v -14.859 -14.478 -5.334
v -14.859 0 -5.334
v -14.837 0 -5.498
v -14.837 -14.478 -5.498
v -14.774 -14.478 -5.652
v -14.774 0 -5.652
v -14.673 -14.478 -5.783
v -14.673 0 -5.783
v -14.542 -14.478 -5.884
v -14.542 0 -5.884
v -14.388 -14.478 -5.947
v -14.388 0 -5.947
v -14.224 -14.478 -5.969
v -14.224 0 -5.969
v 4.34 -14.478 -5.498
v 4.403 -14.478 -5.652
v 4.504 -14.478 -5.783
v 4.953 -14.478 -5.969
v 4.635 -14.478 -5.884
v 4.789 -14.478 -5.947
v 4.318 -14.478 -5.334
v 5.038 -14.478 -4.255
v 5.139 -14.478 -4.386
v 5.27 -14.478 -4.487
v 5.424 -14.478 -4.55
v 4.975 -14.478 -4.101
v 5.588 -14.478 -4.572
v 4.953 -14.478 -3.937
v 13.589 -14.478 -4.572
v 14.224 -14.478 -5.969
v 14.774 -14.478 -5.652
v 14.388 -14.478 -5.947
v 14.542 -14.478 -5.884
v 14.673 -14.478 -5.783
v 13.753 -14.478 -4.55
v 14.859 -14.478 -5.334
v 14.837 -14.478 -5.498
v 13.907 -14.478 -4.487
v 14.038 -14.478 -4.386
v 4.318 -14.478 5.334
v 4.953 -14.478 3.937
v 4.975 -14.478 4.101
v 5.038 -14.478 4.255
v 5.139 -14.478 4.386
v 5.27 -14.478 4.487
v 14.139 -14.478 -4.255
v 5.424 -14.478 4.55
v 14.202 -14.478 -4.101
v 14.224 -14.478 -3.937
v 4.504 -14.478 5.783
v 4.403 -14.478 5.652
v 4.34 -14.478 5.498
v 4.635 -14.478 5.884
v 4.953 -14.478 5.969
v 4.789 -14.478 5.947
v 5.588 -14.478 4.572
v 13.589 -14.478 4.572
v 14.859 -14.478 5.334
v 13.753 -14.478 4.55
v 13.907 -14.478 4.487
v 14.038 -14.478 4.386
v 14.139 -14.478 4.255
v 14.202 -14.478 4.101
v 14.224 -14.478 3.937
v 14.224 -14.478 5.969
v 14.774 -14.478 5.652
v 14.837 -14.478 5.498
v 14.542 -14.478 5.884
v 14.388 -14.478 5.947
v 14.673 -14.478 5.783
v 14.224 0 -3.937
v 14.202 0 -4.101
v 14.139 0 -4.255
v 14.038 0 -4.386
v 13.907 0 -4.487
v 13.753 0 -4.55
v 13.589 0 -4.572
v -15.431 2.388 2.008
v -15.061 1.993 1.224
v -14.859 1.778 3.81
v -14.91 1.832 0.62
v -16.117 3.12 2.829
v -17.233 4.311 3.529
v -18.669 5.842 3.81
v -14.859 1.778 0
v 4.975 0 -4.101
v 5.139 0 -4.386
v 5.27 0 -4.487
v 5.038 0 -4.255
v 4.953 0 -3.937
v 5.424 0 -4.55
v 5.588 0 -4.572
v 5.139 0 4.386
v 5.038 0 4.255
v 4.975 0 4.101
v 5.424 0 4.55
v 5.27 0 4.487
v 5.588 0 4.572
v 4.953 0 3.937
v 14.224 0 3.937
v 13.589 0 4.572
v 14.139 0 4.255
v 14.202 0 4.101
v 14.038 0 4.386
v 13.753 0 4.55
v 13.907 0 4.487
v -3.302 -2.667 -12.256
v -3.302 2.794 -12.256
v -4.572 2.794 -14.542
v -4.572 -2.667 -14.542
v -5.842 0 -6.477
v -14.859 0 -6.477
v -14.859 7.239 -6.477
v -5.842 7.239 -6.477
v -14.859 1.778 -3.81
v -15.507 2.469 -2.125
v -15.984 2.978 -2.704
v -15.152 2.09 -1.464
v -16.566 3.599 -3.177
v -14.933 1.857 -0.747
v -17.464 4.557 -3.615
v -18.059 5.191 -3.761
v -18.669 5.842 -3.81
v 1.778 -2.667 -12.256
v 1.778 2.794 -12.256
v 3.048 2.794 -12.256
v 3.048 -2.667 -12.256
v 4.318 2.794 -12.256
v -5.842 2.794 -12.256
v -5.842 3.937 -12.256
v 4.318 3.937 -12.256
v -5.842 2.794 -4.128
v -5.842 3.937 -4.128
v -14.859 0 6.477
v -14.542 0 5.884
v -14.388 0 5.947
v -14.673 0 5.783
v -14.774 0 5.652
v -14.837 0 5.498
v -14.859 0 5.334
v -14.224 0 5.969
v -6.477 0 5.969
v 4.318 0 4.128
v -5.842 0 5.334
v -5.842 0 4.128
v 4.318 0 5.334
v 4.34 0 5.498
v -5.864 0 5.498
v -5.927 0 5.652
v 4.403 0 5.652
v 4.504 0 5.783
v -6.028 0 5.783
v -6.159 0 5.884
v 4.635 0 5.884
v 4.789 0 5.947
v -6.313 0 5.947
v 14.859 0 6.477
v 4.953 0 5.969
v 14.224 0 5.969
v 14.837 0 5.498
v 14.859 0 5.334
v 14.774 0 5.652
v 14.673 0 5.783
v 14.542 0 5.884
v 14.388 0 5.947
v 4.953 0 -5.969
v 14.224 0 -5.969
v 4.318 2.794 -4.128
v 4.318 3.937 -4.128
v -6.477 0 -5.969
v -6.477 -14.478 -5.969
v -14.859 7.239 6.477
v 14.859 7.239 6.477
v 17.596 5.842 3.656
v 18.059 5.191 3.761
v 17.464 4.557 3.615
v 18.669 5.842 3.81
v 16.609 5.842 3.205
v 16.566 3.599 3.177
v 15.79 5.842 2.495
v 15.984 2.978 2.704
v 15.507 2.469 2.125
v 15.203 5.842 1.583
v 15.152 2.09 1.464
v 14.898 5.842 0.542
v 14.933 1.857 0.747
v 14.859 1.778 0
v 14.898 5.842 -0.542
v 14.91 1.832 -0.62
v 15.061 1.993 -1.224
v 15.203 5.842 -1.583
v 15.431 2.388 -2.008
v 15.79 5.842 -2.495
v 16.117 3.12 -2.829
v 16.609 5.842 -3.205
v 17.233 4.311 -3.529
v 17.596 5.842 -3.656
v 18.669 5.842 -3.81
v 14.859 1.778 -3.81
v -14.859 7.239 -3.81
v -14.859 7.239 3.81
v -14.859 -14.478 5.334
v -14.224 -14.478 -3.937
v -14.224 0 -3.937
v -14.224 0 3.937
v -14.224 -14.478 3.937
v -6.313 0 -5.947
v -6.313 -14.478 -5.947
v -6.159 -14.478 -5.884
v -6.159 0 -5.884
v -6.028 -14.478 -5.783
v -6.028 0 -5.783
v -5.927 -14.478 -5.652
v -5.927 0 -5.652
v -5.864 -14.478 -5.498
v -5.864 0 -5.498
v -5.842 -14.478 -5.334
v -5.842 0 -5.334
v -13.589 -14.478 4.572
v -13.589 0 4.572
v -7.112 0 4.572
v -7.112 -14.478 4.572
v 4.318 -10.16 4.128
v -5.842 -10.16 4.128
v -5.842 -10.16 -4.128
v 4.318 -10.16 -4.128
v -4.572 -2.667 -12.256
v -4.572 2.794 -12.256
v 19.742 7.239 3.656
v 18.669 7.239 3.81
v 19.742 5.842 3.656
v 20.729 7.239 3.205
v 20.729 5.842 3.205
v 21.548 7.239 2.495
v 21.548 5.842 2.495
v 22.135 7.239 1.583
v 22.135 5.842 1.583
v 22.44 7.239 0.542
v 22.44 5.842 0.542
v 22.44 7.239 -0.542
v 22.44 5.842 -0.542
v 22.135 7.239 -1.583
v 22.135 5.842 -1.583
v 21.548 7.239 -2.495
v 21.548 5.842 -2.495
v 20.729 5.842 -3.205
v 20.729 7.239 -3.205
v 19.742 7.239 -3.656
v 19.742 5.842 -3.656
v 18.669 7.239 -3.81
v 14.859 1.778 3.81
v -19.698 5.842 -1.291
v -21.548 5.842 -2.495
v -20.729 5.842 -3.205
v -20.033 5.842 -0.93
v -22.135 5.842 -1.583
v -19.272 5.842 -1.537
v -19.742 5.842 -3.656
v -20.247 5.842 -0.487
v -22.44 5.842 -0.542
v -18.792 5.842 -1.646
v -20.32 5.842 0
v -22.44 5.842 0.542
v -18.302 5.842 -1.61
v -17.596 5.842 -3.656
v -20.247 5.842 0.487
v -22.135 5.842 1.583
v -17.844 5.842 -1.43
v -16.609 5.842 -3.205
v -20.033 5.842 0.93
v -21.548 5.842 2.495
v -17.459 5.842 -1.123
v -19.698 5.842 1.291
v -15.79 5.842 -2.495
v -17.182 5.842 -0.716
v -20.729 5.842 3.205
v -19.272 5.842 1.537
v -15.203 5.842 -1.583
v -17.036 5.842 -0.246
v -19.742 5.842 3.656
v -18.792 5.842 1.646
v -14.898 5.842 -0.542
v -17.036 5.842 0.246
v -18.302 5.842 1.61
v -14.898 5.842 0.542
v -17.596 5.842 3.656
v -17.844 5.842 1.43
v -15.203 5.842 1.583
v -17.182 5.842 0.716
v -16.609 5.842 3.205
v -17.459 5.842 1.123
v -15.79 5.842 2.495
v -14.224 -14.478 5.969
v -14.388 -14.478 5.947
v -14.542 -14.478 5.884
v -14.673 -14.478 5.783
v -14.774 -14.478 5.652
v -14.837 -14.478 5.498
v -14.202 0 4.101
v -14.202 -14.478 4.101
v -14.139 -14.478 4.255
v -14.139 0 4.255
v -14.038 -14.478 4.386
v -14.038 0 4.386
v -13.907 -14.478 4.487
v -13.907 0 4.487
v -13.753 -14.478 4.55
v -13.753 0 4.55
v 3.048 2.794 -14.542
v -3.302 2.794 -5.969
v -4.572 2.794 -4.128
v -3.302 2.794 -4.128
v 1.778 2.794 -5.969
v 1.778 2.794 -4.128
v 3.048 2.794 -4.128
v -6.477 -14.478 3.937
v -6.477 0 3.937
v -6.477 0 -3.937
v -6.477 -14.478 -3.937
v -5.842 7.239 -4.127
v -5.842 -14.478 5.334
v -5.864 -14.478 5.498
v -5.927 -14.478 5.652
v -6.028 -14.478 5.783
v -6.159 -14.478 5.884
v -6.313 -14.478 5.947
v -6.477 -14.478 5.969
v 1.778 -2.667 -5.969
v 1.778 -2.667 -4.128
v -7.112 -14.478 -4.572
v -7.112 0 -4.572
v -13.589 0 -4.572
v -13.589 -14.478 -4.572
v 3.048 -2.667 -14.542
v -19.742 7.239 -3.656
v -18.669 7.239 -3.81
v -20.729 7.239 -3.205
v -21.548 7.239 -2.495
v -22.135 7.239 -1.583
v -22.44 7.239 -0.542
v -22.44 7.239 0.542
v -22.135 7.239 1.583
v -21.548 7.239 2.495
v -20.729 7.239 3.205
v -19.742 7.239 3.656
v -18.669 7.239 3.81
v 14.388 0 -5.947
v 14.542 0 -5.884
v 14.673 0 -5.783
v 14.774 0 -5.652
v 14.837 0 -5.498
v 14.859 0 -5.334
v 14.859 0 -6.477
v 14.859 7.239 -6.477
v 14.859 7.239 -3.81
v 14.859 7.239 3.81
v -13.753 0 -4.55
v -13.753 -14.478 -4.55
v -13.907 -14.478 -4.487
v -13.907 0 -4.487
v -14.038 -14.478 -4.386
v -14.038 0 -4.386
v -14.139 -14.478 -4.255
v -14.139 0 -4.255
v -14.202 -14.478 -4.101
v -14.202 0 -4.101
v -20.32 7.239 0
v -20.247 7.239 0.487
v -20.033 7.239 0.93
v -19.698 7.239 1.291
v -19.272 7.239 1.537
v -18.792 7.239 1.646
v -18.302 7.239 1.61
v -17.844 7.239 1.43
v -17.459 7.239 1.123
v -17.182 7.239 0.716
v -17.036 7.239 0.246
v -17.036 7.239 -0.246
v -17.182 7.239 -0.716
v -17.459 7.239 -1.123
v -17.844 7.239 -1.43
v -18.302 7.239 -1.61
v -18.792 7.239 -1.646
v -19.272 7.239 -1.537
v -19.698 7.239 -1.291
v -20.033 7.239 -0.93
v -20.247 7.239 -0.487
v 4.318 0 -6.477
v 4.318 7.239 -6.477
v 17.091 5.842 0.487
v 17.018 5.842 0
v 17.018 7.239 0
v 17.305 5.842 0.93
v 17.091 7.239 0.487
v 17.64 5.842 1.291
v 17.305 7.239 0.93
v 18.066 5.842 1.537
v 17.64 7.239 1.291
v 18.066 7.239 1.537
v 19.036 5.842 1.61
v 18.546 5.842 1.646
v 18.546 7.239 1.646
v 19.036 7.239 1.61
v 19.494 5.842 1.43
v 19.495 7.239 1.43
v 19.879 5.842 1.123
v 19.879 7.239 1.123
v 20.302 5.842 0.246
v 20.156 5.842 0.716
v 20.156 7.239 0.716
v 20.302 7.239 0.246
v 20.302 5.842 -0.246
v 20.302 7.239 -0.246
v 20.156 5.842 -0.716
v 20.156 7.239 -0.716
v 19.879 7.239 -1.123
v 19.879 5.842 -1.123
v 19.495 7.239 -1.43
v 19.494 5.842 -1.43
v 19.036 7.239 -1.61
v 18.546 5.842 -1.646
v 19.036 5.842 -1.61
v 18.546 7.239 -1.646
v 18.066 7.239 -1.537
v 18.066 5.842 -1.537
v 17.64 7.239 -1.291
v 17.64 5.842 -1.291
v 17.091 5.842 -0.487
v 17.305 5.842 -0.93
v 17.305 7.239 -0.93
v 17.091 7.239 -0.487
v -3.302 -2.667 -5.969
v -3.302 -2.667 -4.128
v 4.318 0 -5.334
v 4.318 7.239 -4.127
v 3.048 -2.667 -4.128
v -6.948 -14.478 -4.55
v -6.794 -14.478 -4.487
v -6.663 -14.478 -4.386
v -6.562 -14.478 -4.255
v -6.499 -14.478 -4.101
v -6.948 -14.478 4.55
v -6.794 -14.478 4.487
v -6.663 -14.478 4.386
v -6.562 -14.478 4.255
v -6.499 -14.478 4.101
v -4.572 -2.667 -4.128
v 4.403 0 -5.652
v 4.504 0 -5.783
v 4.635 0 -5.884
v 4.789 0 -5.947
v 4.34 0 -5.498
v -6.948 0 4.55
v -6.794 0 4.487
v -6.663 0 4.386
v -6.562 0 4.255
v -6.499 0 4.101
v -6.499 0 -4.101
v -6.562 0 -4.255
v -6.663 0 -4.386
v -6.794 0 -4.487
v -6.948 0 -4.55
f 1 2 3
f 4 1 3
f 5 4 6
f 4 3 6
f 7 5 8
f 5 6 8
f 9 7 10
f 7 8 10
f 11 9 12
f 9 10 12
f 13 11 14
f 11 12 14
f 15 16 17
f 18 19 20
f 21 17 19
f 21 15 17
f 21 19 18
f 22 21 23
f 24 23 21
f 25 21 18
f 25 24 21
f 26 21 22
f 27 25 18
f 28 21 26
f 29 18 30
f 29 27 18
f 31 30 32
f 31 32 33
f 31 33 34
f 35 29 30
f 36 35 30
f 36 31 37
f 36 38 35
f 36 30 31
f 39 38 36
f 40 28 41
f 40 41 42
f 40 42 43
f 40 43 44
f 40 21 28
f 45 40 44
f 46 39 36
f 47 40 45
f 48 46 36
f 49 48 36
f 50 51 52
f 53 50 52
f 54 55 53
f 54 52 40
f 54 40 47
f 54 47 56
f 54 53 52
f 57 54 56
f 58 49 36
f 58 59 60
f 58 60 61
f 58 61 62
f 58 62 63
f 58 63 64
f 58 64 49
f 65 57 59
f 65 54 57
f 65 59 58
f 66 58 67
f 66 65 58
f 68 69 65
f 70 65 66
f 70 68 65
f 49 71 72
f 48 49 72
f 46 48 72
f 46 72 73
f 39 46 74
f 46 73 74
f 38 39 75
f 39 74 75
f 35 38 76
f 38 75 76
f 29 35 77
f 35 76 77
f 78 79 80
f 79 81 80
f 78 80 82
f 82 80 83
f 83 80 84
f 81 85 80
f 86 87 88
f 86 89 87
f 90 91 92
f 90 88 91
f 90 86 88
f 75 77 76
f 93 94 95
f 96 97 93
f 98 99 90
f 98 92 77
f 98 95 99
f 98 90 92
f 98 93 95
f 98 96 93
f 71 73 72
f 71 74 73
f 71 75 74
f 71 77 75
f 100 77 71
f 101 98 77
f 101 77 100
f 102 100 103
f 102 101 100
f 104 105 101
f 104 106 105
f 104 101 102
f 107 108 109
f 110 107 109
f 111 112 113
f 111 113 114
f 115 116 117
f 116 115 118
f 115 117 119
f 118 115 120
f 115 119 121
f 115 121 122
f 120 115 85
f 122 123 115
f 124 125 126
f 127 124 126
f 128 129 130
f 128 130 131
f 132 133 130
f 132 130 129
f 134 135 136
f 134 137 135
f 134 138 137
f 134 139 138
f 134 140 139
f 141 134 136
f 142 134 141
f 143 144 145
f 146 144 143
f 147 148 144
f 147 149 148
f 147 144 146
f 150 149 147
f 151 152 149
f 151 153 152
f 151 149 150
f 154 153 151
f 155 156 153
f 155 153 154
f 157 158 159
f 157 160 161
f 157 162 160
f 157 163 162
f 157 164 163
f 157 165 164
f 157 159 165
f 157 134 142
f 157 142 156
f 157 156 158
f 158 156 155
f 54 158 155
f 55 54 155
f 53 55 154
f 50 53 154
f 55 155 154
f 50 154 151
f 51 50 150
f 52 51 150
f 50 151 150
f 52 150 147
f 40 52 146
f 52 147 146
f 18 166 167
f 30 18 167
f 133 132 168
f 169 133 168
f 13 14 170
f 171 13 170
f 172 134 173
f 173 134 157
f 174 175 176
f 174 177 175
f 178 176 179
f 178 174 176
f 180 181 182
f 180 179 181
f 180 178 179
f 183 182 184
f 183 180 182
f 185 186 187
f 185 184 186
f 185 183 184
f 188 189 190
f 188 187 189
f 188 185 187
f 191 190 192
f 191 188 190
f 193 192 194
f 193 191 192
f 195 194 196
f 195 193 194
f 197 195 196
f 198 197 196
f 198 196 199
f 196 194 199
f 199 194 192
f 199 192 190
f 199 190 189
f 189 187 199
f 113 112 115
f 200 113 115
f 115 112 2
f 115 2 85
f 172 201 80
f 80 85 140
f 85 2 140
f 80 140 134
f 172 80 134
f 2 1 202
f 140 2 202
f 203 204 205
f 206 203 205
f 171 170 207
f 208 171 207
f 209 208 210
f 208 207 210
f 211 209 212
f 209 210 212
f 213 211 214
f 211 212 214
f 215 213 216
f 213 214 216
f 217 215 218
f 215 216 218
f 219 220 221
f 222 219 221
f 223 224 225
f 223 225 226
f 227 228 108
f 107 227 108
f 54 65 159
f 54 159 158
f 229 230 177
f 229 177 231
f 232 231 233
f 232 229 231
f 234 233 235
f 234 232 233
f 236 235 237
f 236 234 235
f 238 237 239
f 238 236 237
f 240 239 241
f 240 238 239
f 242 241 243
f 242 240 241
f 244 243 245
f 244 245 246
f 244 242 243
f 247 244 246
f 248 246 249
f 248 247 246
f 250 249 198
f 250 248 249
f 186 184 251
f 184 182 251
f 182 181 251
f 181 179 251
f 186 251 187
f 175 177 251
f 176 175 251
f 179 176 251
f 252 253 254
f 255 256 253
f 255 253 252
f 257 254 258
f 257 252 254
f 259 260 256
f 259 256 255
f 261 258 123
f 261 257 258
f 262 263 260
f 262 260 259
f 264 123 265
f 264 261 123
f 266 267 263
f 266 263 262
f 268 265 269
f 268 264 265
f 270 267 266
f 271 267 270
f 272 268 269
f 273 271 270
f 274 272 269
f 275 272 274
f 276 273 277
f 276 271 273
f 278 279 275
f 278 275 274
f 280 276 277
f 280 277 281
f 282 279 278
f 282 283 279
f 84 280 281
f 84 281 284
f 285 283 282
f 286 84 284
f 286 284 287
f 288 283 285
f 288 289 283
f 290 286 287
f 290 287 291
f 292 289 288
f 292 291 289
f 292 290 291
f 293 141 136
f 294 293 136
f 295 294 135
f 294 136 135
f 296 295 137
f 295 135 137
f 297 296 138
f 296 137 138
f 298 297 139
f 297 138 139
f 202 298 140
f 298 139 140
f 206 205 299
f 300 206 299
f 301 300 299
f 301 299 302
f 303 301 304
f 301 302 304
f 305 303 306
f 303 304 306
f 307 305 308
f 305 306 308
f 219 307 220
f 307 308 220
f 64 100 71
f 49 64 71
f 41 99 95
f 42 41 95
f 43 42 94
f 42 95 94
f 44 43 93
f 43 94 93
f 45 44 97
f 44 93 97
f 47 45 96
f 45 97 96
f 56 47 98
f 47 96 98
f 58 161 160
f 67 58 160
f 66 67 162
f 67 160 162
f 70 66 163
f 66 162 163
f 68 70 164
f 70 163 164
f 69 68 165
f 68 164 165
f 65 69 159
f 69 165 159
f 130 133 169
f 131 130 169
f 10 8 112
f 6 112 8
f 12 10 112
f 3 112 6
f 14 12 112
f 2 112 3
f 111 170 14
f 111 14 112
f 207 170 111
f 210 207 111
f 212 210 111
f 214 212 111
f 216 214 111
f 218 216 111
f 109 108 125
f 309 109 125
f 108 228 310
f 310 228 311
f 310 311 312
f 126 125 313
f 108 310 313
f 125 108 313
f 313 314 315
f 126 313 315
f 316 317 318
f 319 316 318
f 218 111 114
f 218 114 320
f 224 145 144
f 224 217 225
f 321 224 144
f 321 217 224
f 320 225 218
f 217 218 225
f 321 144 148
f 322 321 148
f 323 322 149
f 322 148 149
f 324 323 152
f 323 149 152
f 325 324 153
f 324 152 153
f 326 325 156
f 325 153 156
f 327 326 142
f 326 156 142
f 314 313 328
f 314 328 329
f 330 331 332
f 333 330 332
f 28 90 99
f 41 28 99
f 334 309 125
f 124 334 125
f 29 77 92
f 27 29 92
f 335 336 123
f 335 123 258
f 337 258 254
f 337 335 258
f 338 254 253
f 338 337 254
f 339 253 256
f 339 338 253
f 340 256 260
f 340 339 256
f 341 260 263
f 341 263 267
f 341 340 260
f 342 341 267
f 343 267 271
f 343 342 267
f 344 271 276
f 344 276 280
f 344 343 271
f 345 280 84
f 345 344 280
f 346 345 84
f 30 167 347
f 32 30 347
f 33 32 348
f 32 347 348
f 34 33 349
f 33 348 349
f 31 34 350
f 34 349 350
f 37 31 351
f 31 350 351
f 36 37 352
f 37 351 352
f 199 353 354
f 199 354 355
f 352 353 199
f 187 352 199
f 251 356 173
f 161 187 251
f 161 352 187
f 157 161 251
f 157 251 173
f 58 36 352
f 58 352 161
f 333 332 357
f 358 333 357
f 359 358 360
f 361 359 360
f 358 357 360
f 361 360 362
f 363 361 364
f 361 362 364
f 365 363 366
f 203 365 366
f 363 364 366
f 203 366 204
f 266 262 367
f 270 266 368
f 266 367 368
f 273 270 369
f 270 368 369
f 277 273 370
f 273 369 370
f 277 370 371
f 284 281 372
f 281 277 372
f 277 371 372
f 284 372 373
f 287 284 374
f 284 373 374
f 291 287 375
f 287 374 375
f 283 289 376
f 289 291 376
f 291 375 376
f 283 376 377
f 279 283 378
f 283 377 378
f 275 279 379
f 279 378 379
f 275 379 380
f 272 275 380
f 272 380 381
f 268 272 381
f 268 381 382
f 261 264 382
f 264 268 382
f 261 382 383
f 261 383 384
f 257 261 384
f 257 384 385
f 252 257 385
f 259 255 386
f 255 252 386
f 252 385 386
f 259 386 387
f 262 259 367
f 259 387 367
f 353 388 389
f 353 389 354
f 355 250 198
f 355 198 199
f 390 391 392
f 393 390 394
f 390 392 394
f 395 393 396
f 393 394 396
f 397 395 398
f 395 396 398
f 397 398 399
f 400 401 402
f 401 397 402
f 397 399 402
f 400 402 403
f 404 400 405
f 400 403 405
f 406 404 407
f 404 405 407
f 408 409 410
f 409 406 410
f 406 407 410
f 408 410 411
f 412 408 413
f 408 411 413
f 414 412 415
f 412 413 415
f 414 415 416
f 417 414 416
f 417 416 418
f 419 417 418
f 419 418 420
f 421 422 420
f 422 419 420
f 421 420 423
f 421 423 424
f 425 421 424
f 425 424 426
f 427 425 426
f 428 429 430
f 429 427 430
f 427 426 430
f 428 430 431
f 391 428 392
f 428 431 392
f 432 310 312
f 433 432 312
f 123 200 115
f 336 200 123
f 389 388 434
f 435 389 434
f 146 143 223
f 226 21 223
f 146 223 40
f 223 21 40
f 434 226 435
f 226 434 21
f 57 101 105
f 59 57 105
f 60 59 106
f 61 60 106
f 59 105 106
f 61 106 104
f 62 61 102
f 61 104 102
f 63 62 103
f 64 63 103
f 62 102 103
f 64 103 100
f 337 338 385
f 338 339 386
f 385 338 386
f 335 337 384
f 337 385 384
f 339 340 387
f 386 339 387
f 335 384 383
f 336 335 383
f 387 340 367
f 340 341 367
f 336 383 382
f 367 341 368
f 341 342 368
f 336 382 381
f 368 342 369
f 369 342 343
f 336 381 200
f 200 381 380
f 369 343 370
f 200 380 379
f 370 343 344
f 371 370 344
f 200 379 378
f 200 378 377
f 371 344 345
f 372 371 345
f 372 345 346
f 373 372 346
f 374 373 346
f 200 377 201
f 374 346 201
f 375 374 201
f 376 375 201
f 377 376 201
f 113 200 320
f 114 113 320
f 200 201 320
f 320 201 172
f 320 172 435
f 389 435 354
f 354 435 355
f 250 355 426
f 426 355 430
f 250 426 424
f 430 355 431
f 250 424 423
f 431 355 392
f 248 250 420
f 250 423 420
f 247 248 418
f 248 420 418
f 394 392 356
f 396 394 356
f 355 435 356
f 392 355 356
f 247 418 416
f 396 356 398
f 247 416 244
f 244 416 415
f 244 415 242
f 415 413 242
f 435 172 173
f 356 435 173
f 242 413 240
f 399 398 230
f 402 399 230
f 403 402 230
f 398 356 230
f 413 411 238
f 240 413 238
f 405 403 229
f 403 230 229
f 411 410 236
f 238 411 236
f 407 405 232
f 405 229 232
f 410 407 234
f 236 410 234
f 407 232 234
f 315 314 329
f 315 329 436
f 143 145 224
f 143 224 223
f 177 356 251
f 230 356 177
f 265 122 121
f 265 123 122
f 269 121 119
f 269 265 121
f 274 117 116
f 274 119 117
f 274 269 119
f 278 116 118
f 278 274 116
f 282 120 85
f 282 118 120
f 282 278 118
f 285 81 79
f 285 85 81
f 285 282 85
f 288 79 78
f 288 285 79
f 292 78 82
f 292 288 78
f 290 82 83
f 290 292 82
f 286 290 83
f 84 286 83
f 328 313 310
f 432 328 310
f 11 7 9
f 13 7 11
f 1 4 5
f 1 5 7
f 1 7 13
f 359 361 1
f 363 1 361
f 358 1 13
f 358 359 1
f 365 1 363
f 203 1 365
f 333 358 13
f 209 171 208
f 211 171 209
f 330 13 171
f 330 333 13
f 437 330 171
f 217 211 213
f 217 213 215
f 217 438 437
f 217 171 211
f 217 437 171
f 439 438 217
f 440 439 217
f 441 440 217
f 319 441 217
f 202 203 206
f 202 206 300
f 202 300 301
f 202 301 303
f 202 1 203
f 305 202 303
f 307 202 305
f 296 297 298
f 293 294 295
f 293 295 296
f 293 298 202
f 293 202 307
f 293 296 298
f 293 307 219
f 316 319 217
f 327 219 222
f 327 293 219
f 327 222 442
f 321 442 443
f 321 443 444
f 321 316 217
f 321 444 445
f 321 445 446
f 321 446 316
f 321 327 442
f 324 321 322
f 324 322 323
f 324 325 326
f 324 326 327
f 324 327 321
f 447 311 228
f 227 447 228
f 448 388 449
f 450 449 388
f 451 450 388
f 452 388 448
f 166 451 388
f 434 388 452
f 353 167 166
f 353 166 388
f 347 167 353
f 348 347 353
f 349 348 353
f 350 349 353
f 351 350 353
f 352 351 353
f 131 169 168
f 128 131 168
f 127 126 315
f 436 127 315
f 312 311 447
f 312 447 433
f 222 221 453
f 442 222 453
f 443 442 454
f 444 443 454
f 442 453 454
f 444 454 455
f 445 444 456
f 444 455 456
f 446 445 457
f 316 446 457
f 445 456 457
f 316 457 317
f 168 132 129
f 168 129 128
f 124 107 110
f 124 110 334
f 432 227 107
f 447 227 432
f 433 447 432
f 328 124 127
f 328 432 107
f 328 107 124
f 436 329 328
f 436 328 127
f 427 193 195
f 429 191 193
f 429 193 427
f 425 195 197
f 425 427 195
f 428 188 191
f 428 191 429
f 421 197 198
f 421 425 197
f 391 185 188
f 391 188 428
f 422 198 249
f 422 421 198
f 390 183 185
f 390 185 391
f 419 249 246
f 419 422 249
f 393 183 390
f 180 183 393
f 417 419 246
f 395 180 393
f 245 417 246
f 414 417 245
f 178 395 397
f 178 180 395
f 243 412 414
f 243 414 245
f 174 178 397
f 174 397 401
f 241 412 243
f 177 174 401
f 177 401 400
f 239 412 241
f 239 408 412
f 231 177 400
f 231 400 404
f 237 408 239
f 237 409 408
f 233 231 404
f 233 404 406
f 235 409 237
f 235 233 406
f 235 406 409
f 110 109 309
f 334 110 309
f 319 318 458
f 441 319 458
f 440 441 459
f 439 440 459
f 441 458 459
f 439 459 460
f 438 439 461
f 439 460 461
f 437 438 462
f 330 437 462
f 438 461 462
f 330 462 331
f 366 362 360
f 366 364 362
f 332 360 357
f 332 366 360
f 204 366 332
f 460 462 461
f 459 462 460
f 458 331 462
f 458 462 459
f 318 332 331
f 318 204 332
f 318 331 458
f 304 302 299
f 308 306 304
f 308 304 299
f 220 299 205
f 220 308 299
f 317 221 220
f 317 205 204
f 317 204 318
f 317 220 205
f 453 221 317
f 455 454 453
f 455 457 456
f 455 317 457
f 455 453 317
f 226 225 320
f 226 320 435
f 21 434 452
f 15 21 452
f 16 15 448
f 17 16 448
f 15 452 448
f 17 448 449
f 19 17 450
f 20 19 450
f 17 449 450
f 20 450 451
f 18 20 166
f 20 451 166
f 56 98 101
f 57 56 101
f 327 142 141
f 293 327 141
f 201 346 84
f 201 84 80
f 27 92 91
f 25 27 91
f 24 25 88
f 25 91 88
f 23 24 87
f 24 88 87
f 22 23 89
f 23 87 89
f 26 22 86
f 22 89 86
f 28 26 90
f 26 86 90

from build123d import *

# Parameters (mm, degrees)
F0_W      = 29.718
F0_H      = 12.954
F1_DEPTH  = 7.239
F3_DEPTH  = 14.478
F5_DEPTH  = 14.478
F6_W      = 10.16
F6_H      = 8.255
F7_DEPTH  = 10.16
F8_R      = 1.651
F9_DEPTH  = 5.461
F10_W     = 3.81
F10_H     = 4.064
F11_DEPTH = 10.288
F12_R     = 3.81
F13_DEPTH = 20.321
F14_W     = 10.16
F14_H     = 2.3495
F15_DEPTH = 7.24
F16_W     = 10.16
F16_H     = 1.143
F17_DEPTH = 8.128
F18_W     = 1.27
F18_H     = 1.8415
F19_DEPTH = 5.461


with BuildPart() as f1:
    # F0 (on Front) → F1 (new body)
    with BuildSketch(Plane.XZ):
        Rectangle(F0_W, F0_H)
    extrude(amount=-F1_DEPTH)

    # F2 (on face) → F3 (join)
    with BuildSketch(Plane.XZ):
        with BuildLine():
            Line((-6.477, 5.969), (-14.224, 5.969))
            ThreePointArc((-14.224, 5.969), (-14.673013, 5.783013), (-14.859, 5.334))
            Line((-14.859, 5.334), (-14.859, -5.334))
            ThreePointArc((-14.859, -5.334), (-14.673013, -5.783013), (-14.224, -5.969))
            Line((-14.224, -5.969), (-6.477, -5.969))
            ThreePointArc((-6.477, -5.969), (-6.027987, -5.783013), (-5.842, -5.334))
            Line((-5.842, -5.334), (-5.842, 5.334))
            ThreePointArc((-5.842, 5.334), (-6.027987, 5.783013), (-6.477, 5.969))
        make_face()
        with BuildLine():
            Line((-14.224, -3.937), (-14.224, 3.937))
            ThreePointArc((-14.224, 3.937), (-14.038013, 4.386013), (-13.589, 4.572))
            Line((-13.589, 4.572), (-7.112, 4.572))
            ThreePointArc((-7.112, 4.572), (-6.662987, 4.386013), (-6.477, 3.937))
            Line((-6.477, 3.937), (-6.477, -3.937))
            ThreePointArc((-6.477, -3.937), (-6.662987, -4.386013), (-7.112, -4.572))
            Line((-7.112, -4.572), (-13.589, -4.572))
            ThreePointArc((-13.589, -4.572), (-14.038013, -4.386013), (-14.224, -3.937))
        make_face(mode=Mode.SUBTRACT)
    extrude(amount=F3_DEPTH)

    # F4 (on face) → F5 (join, through all)
    with BuildSketch(Plane.XZ):
        with BuildLine():
            Line((14.224, 5.969), (4.953, 5.969))
            ThreePointArc((4.953, 5.969), (4.503987, 5.783013), (4.318, 5.334))
            Line((4.318, 5.334), (4.318, -5.334))
            ThreePointArc((4.318, -5.334), (4.503987, -5.783013), (4.953, -5.969))
            Line((4.953, -5.969), (14.224, -5.969))
            ThreePointArc((14.224, -5.969), (14.673013, -5.783013), (14.859, -5.334))
            Line((14.859, -5.334), (14.859, 5.334))
            ThreePointArc((14.859, 5.334), (14.673013, 5.783013), (14.224, 5.969))
        make_face()
        with BuildLine():
            ThreePointArc((4.953, 3.937), (5.138987, 4.386013), (5.588, 4.572))
            Line((5.588, 4.572), (13.589, 4.572))
            ThreePointArc((13.589, 4.572), (14.038013, 4.386013), (14.224, 3.937))
            Line((14.224, 3.937), (14.224, -3.937))
            ThreePointArc((14.224, -3.937), (14.038013, -4.386013), (13.589, -4.572))
            Line((13.589, -4.572), (5.588, -4.572))
            ThreePointArc((5.588, -4.572), (5.138987, -4.386013), (4.953, -3.937))
            Line((4.953, -3.937), (4.953, 3.937))
        make_face(mode=Mode.SUBTRACT)
    extrude(amount=F5_DEPTH)

    # F6 (on face) → F7 (join)
    with BuildSketch(Plane.XZ):
        with Locations((-0.762, 0)):
            Rectangle(F6_W, F6_H)
    extrude(amount=F7_DEPTH)

    # F8 (on face) → F9 (join)
    with BuildSketch(Plane(origin=(0, 7.239, 0), x_dir=(-1, 0, 0), z_dir=(0, 1, 0))):
        with BuildLine():
            Line((14.859, -3.81), (18.669, -3.81))
            ThreePointArc((18.669, -3.81), (22.479, 0), (18.669, 3.81))
            Line((18.669, 3.81), (14.859, 3.81))
            Line((14.859, 3.81), (14.859, -3.81))
        make_face()
        with Locations((18.669, 0)):
            Circle(F8_R, mode=Mode.SUBTRACT)
        with BuildLine():
            Line((-18.669, -3.81), (-14.859, -3.81))
            Line((-14.859, -3.81), (-14.859, 3.81))
            Line((-14.859, 3.81), (-18.669, 3.81))
            ThreePointArc((-18.669, 3.81), (-22.479, 0), (-18.669, -3.81))
        make_face()
        with Locations((-18.669, 0)):
            Circle(F8_R, mode=Mode.SUBTRACT)
    extrude(amount=-F9_DEPTH)

    # F10 (on face) → F11 (cut, through all)
    with BuildSketch(Plane.XY.offset(3.81)):
        Polygon((-22.479, 1.778), (-14.859, 1.778), (-18.669, 5.842), (-22.479, 5.842), align=None)
        with Locations((20.574, 3.81)):
            Rectangle(F10_W, F10_H)
        Polygon((18.669, 1.778), (18.669, 5.842), (14.859, 1.778), align=None)
    extrude(amount=-F11_DEPTH, mode=Mode.SUBTRACT)

    # F12 (on face) → F13 (cut, through all)
    with BuildSketch(Plane.XZ.offset(-5.842)):
        with Locations((18.669, 0)):
            Circle(F12_R)
        with Locations((-18.669, 0)):
            Circle(F12_R)
    extrude(amount=F13_DEPTH, mode=Mode.SUBTRACT)

    # F14 (on face) → F15 (cut, through all)
    with BuildSketch(Plane.XZ):
        with Locations((-0.762, -5.30225)):
            Rectangle(F14_W, F14_H)
    extrude(amount=-F15_DEPTH, mode=Mode.SUBTRACT)


with BuildPart() as f17:
    # F16 (on face) → F17 (new body)
    with BuildSketch(Plane(origin=(0, 0, -4.1275), x_dir=(1, 0, 0), z_dir=(0, 0, -1))):
        with Locations((-0.762, -3.3655)):
            Rectangle(F16_W, F16_H)
    extrude(amount=F17_DEPTH)


with BuildPart() as f19:
    # F18 (on face) → F19 (new body)
    with BuildSketch(Plane.XZ.offset(-2.794)):
        Polygon((-3.302, -5.969), (-4.572, -5.969), (-4.572, -12.2555), (-3.302, -12.2555), (1.778, -12.2555), (3.048, -12.2555), (3.048, -5.969), (1.778, -5.969), align=None)
        with Locations((-3.937, -5.04825)):
            Rectangle(F18_W, F18_H)
        with Locations((2.413, -5.04825)):
            Rectangle(F18_W, F18_H)
        Polygon((1.778, -12.2555), (-3.302, -12.2555), (-4.572, -14.5415), (3.048, -14.5415), align=None)
    extrude(amount=F19_DEPTH)


solid = Compound([f1.part, f17.part, f19.part])
